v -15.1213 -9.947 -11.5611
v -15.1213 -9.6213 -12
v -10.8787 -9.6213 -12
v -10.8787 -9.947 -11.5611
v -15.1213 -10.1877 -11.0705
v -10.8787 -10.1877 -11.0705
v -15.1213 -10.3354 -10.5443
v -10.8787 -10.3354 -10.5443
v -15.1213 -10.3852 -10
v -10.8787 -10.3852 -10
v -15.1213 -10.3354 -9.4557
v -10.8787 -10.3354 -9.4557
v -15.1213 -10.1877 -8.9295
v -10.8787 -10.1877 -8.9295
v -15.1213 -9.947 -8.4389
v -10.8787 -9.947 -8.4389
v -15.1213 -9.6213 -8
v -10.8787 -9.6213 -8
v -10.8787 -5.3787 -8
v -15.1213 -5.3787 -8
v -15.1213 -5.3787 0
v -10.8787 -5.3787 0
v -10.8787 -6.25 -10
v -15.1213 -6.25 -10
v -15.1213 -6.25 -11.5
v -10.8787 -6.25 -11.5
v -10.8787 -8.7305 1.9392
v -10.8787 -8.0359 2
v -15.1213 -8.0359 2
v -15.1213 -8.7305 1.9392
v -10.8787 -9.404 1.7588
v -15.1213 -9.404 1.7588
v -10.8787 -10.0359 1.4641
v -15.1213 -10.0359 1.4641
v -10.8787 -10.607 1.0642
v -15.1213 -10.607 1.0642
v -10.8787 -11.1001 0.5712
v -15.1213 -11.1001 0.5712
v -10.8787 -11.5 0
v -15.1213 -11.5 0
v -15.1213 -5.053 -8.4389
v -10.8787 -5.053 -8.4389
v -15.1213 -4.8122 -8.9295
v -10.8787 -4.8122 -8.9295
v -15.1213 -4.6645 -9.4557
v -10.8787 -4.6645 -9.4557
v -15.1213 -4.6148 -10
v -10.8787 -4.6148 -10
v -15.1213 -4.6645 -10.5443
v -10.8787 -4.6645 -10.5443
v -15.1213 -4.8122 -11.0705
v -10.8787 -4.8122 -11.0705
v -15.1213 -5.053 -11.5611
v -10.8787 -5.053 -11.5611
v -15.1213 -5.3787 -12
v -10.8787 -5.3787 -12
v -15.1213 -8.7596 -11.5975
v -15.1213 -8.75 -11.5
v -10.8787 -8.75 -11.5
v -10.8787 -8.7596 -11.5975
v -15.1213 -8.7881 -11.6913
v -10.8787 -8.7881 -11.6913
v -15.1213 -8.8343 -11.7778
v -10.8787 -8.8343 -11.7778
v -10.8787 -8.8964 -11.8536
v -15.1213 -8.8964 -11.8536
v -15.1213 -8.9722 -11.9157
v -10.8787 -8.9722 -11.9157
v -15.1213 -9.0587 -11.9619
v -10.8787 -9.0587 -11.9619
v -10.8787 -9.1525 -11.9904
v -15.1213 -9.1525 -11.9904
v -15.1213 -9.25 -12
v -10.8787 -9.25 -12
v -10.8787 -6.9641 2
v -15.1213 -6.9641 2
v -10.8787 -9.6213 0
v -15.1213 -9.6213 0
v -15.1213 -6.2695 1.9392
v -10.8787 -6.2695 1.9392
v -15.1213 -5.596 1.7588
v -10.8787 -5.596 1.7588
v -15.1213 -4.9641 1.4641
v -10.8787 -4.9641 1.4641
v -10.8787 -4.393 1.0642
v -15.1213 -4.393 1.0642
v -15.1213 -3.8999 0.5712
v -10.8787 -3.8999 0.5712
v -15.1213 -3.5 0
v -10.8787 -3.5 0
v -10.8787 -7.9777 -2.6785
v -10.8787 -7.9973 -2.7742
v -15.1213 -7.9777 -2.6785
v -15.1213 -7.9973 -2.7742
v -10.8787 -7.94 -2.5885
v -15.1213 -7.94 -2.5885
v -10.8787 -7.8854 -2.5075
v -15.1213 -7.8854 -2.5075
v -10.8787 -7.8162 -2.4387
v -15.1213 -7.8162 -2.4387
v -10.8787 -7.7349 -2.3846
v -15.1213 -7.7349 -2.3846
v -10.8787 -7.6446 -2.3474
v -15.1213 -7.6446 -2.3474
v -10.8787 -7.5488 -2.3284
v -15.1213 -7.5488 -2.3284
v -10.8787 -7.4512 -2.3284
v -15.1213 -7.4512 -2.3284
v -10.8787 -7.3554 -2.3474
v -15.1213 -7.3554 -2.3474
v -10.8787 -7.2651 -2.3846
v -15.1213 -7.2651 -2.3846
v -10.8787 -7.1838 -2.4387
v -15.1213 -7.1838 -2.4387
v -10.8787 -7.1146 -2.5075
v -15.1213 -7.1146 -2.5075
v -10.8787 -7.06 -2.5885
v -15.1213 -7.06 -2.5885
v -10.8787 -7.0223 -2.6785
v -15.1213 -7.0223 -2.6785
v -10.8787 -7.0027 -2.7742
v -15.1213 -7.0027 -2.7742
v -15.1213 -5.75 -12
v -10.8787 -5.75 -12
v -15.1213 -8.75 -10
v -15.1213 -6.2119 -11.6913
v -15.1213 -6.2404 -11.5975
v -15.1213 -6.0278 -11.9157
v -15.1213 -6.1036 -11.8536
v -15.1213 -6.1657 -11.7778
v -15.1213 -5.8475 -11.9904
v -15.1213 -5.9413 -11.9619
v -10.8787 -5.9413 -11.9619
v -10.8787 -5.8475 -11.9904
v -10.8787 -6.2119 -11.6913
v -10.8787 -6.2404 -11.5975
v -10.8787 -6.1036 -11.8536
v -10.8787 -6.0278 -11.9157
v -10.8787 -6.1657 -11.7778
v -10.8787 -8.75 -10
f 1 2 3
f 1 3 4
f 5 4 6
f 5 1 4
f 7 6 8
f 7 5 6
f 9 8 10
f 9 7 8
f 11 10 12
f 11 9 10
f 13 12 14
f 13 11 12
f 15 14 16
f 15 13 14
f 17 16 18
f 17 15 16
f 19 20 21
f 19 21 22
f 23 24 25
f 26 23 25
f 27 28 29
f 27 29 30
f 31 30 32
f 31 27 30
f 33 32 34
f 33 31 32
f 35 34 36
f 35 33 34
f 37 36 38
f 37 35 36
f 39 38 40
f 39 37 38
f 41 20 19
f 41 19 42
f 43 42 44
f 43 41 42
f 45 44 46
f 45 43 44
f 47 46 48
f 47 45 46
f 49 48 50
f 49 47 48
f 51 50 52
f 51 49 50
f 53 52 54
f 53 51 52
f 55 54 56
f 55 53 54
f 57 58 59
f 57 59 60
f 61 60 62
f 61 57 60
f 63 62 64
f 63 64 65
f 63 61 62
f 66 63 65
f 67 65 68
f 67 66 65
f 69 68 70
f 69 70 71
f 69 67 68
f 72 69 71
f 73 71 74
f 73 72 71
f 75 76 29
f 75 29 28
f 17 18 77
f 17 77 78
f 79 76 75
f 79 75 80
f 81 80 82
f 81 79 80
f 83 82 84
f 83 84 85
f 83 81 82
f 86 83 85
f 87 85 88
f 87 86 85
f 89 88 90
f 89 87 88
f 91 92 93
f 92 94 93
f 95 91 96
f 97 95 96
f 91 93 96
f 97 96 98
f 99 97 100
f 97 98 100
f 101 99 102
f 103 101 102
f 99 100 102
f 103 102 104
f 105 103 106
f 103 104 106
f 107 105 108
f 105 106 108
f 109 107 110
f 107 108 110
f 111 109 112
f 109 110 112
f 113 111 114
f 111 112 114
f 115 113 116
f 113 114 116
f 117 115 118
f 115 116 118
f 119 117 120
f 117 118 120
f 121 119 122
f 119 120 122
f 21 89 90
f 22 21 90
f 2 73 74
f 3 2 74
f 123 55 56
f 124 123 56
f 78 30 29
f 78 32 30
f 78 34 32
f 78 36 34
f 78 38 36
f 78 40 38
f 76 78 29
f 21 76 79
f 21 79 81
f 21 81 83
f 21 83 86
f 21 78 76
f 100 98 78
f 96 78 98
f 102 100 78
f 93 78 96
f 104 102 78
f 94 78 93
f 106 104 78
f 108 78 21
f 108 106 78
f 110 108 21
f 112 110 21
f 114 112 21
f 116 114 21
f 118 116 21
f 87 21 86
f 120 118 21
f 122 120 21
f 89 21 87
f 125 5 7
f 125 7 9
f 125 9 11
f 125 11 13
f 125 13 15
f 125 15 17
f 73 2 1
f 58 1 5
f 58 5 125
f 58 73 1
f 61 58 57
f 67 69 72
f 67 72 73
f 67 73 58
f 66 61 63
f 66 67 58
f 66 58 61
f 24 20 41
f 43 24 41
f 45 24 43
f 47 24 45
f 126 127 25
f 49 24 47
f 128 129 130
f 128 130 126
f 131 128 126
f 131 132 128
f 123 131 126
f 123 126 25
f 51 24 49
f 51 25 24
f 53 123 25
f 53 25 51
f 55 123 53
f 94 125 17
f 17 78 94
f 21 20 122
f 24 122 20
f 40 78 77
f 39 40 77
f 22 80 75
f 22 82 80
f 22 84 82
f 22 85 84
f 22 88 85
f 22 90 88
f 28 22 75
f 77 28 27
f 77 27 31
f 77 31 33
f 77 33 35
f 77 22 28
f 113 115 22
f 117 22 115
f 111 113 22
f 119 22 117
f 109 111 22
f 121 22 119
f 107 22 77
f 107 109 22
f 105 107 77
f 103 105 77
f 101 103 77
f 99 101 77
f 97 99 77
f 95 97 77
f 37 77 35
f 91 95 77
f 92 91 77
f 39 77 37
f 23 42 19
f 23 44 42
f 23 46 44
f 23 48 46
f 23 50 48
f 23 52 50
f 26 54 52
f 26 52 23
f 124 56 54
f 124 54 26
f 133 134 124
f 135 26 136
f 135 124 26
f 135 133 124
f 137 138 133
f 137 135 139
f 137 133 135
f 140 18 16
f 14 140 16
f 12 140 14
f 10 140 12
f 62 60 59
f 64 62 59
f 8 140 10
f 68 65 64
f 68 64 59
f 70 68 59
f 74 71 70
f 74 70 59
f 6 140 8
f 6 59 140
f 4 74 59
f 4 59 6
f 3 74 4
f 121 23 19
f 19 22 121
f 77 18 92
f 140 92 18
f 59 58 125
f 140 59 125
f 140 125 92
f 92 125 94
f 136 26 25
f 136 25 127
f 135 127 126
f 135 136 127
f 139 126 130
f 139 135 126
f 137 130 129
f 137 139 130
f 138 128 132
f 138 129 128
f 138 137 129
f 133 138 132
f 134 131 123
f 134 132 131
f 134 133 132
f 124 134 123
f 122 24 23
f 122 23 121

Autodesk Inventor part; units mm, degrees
ref_plane "YZ Plane" through (0, 0, 0) normal (1, 0, 0) x (0, 1, 0)
ref_plane "XZ Plane" through (0, 0, 0) normal (0, 1, 0) x (-1, 0, 0)
ref_plane "XY Plane" through (0, 0, 0) normal (0, 0, 1) x (1, 0, 0)
ref_plane "Work Plane1" through (0, 0, 0) normal (0, 0, 1) x (1, 0, 0)
sketch "Sketch1" plane through (0, 0, 0) normal (0, 0, 1) x (1, 0, 0)
  circle A0 centre (-13, -7.5) radius 3 projected
  line L0 (-13, -7.5) -> (-10.8787, -9.6213) construction
  line L1 (-13, -7.5) -> (-10, -7.5) construction
  line L2 (-15.1213, -5.3787) -> (-10.8787, -5.3787)
  line L3 (-10.8787, -5.3787) -> (-10.8787, -9.6213)
  line L4 (-10.8787, -9.6213) -> (-15.1213, -9.6213)
  line L5 (-15.1213, -9.6213) -> (-15.1213, -5.3787)
  line L6 (-15.1213, -5.3787) -> (-10.8787, -9.6213) construction
  line L7 (-10.8787, -5.3787) -> (-15.1213, -9.6213) construction
  point P0 (0, 0)
  dimension "d0" = 45
extrude "Extrusion1" add sketch "Sketch1" against normal blind 12 contours L3 L4 L5 L2
sketch "Sketch2" plane through (0, 0, 0) normal (0, 0, 1) x (1, 0, 0)
  circle A0 centre (-13, -7.5) radius 3 projected
  line L0 (-10.8787, -11.5) -> (-15.1213, -11.5)
  line L1 (-15.1213, -11.5) -> (-15.1213, -3.5)
  line L2 (-15.1213, -3.5) -> (-10.8787, -3.5)
  line L3 (-10.8787, -3.5) -> (-10.8787, -11.5)
  line L4 (-10.8787, -11.5) -> (-15.1213, -3.5) construction
  line L5 (-15.1213, -11.5) -> (-10.8787, -3.5) construction
  point P0 (0, 0)
  dimension "d3" = 8
extrude "Extrusion2" add sketch "Sketch2" along normal blind 2 contours L3 A0 L1 | A0 L1 L2 L3 | L3 L0 L1 A0
fillet "Fillet1" radius 4 2 edges at (-13, -3.5, 2) (-13, -11.5, 2)
sketch "Sketch3" plane through (-15.1213, -9.6213, -12) normal (-1, 0, 0) x (0, 0, 1)
  line L0 (4, 9.5928) -> (4, -5.4072) projected
  line L1 (12, 0) -> (0, 0) projected
  arc A0 (0, 0) -> (4, 0) centre (2, 2.2361) ccw
  line L2 (12, 4.2426) -> (0, 4.2426) projected
  arc A1 (4, 4.2426) -> (0, 4.2426) centre (2, 2.0066) ccw
  point P0 (12, 9.6213)
  dimension "d7" = 3
  dimension "d8" = 3
extrude "Extrusion3" add sketch "Sketch3" against normal up to surface (4.2426 mm away)
sketch "Sketch4" plane through (-15.1213, -5.3787, 0) normal (-1, 0, 0) x (0, 0, 1)
  line L0 (-14, -3.3713) -> (-10, -3.3713)
  line L1 (-10, -3.3713) -> (-10, -0.8713)
  line L2 (-10, -0.8713) -> (-14, -0.8713)
  line L3 (-14, -0.8713) -> (-14, -3.3713)
  line L4 (-12, -4.2426) -> (-12, 0) projected
  line L5 (-14, -3.3713) -> (-10, -0.8713) construction
  line L6 (-10, -3.3713) -> (-14, -0.8713) construction
  line L7 (-10, -3.3713) -> (-2.7742, -2.6186)
  line L8 (2, -1.5854) -> (2, -2.6572) projected
  line L9 (-10, -0.8713) -> (-2.7742, -1.624)
  arc A0 (-2.7742, -2.6186) -> (-2.7742, -1.624) centre (-2.826, -2.1213) ccw
  point P0 (0, 5.3787)
  point P1 (-12, -2.1213)
  point P2 (2, -2.1213)
  dimension "d11" = 4
  dimension "d12" = 2.5
  dimension "d13" = 0.5
extrude "Extrusion4" cut sketch "Sketch4" against normal up to next
fillet "Fillet2" radius 0.5 2 edges at (-13, -6.25, -12) (-13, -8.75, -12)
properties part number "fastener"
